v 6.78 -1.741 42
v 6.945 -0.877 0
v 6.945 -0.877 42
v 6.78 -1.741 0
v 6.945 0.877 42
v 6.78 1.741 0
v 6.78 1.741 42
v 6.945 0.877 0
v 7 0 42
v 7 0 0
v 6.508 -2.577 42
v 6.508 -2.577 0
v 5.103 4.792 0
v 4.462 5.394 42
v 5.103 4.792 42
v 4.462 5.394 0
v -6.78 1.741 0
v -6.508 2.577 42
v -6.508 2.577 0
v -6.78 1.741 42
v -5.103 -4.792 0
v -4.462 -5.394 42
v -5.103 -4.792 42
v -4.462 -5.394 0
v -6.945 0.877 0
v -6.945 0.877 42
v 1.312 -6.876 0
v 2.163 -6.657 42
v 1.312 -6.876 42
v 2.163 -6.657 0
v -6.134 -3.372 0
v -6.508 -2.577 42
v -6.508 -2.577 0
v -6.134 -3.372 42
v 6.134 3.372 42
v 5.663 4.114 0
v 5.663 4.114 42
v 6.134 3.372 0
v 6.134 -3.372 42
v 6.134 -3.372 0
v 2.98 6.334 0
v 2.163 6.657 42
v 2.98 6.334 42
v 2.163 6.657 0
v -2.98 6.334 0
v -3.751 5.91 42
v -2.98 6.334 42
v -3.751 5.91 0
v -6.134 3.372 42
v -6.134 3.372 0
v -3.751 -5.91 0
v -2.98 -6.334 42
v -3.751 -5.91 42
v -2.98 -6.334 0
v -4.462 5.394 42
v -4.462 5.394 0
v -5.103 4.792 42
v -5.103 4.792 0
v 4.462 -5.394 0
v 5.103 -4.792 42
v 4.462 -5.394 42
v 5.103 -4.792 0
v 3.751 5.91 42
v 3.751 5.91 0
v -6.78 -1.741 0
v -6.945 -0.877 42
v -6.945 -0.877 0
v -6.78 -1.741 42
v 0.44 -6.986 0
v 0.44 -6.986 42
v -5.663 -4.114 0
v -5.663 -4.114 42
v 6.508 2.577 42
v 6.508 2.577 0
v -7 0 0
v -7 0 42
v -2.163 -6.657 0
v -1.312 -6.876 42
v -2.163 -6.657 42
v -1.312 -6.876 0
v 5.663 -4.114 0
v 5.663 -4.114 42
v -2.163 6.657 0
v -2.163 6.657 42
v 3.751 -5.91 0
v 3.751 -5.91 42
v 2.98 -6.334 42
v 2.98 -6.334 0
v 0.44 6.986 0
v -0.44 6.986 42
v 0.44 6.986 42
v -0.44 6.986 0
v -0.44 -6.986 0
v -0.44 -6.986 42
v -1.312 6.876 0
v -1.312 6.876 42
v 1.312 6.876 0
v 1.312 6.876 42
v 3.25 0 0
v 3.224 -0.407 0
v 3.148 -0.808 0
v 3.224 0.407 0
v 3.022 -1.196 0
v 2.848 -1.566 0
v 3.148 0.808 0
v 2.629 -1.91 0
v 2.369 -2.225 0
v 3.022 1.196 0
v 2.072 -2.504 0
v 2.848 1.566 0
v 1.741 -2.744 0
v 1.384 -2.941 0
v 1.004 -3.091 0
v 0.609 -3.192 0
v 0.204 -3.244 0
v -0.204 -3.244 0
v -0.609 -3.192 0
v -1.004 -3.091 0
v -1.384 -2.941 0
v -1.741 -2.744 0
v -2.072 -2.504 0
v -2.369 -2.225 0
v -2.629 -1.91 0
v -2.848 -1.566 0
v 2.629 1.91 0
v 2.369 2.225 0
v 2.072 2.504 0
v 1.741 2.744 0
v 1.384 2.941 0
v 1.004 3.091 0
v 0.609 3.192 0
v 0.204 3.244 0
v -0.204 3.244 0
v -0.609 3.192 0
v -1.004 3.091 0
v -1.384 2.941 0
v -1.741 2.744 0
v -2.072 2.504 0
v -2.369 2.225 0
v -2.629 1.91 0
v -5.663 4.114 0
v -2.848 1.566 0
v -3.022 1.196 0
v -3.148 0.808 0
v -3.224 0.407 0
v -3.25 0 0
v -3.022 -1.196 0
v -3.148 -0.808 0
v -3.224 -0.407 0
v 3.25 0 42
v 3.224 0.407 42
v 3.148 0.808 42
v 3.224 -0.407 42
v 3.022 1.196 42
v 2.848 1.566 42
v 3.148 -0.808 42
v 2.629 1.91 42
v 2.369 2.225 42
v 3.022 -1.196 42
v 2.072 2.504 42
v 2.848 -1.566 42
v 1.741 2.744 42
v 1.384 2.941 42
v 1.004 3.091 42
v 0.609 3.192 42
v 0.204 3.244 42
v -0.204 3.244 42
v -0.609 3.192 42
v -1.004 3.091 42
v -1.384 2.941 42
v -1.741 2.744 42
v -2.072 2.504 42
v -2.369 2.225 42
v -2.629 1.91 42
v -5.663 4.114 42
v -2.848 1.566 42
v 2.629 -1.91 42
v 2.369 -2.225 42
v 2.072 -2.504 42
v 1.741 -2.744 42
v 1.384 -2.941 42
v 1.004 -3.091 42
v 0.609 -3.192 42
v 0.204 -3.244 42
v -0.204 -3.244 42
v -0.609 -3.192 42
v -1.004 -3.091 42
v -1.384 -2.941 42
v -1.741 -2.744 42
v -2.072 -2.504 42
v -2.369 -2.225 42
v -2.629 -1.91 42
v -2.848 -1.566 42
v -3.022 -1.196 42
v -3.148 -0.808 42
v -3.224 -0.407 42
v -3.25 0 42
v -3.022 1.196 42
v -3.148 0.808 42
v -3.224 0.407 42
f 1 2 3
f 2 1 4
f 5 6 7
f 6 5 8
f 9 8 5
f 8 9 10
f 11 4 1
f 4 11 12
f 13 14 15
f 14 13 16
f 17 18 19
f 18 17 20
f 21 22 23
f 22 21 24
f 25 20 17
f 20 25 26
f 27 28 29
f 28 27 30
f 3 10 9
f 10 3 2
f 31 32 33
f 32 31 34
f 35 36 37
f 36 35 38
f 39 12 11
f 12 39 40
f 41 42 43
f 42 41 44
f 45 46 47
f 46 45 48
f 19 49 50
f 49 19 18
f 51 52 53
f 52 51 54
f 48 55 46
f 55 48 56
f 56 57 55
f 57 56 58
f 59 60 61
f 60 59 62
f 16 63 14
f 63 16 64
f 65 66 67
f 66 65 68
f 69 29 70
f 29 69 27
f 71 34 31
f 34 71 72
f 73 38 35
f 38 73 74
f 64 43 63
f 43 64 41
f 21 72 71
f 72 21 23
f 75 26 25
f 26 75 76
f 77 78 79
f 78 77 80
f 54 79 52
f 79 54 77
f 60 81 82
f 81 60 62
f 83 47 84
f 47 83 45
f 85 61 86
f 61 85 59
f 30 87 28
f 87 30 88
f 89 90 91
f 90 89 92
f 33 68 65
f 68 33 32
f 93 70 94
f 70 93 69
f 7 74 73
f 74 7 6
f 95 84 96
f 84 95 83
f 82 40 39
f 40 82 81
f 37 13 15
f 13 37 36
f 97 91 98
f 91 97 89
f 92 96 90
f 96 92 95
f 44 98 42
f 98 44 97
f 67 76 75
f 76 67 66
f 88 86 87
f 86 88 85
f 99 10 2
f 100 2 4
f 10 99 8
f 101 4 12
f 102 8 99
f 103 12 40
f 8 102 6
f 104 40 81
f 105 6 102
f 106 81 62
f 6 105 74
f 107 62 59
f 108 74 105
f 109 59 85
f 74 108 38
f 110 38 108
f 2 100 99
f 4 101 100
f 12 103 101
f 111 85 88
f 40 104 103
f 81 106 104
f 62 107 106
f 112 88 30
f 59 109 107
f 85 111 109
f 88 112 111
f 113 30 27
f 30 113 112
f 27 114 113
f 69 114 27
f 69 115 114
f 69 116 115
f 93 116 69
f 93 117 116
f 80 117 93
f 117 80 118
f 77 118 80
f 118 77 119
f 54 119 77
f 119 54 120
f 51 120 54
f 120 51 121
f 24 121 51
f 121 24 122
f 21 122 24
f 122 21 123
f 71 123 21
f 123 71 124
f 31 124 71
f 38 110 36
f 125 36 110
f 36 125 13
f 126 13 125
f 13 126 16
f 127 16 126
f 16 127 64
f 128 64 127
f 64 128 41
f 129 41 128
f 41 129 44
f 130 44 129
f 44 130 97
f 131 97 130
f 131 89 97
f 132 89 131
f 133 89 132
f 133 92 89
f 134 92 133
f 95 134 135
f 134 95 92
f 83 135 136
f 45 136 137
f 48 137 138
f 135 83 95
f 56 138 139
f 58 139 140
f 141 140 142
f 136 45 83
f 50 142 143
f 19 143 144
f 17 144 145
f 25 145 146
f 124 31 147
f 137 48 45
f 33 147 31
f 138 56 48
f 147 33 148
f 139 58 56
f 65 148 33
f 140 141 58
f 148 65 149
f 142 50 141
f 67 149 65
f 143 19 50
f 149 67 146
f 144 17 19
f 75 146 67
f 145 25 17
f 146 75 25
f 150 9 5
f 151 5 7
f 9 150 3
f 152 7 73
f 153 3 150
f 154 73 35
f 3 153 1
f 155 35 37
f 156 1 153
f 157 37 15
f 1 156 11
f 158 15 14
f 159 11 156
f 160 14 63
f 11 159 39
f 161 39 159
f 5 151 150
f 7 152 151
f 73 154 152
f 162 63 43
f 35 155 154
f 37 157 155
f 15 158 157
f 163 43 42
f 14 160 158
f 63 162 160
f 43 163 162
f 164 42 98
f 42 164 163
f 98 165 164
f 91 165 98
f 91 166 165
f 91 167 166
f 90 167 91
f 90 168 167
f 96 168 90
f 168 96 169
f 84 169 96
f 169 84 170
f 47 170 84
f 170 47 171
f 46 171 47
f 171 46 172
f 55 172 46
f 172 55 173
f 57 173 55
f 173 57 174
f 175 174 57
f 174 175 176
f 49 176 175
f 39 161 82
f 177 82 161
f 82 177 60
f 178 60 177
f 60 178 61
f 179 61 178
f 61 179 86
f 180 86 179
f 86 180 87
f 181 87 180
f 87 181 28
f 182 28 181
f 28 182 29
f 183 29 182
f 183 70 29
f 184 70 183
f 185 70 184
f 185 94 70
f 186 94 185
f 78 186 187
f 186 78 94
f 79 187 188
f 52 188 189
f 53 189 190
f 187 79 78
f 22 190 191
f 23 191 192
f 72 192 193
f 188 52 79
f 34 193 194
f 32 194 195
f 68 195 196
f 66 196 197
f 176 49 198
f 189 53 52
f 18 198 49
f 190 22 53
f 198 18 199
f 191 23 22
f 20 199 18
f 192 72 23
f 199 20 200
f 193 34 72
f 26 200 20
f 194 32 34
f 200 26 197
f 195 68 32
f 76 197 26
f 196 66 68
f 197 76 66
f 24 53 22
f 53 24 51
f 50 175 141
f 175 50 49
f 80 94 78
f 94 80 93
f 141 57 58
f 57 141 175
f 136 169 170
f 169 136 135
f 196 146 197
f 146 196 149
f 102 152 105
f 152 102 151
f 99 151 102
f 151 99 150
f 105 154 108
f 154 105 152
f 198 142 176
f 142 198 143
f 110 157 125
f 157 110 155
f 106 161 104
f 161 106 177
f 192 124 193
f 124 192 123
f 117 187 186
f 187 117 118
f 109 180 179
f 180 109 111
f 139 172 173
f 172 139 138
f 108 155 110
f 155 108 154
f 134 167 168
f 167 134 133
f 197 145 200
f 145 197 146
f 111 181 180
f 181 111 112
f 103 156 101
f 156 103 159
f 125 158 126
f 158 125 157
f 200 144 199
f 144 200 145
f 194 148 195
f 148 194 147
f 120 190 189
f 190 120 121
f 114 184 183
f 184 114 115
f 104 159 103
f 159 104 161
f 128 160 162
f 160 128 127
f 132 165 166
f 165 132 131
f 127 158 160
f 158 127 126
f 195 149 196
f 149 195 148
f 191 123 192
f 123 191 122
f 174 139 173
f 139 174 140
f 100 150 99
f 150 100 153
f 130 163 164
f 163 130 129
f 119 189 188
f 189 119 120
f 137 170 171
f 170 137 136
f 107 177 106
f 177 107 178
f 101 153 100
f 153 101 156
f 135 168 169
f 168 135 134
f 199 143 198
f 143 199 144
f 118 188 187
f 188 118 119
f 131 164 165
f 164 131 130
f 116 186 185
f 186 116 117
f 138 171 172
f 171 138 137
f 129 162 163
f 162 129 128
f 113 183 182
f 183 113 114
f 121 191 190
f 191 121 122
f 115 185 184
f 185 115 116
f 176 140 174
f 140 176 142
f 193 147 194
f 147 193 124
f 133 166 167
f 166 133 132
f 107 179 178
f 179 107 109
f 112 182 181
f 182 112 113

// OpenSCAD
$fn = 50;


difference() {
	union() {
		cylinder(h = 42, r = 7.0000000000);
	}
	union() {
		translate(v = [0.0000000000, 0.0000000000, -100.0000000000]) {
			cylinder(h = 200, r = 3.2500000000);
		}
	}
}
